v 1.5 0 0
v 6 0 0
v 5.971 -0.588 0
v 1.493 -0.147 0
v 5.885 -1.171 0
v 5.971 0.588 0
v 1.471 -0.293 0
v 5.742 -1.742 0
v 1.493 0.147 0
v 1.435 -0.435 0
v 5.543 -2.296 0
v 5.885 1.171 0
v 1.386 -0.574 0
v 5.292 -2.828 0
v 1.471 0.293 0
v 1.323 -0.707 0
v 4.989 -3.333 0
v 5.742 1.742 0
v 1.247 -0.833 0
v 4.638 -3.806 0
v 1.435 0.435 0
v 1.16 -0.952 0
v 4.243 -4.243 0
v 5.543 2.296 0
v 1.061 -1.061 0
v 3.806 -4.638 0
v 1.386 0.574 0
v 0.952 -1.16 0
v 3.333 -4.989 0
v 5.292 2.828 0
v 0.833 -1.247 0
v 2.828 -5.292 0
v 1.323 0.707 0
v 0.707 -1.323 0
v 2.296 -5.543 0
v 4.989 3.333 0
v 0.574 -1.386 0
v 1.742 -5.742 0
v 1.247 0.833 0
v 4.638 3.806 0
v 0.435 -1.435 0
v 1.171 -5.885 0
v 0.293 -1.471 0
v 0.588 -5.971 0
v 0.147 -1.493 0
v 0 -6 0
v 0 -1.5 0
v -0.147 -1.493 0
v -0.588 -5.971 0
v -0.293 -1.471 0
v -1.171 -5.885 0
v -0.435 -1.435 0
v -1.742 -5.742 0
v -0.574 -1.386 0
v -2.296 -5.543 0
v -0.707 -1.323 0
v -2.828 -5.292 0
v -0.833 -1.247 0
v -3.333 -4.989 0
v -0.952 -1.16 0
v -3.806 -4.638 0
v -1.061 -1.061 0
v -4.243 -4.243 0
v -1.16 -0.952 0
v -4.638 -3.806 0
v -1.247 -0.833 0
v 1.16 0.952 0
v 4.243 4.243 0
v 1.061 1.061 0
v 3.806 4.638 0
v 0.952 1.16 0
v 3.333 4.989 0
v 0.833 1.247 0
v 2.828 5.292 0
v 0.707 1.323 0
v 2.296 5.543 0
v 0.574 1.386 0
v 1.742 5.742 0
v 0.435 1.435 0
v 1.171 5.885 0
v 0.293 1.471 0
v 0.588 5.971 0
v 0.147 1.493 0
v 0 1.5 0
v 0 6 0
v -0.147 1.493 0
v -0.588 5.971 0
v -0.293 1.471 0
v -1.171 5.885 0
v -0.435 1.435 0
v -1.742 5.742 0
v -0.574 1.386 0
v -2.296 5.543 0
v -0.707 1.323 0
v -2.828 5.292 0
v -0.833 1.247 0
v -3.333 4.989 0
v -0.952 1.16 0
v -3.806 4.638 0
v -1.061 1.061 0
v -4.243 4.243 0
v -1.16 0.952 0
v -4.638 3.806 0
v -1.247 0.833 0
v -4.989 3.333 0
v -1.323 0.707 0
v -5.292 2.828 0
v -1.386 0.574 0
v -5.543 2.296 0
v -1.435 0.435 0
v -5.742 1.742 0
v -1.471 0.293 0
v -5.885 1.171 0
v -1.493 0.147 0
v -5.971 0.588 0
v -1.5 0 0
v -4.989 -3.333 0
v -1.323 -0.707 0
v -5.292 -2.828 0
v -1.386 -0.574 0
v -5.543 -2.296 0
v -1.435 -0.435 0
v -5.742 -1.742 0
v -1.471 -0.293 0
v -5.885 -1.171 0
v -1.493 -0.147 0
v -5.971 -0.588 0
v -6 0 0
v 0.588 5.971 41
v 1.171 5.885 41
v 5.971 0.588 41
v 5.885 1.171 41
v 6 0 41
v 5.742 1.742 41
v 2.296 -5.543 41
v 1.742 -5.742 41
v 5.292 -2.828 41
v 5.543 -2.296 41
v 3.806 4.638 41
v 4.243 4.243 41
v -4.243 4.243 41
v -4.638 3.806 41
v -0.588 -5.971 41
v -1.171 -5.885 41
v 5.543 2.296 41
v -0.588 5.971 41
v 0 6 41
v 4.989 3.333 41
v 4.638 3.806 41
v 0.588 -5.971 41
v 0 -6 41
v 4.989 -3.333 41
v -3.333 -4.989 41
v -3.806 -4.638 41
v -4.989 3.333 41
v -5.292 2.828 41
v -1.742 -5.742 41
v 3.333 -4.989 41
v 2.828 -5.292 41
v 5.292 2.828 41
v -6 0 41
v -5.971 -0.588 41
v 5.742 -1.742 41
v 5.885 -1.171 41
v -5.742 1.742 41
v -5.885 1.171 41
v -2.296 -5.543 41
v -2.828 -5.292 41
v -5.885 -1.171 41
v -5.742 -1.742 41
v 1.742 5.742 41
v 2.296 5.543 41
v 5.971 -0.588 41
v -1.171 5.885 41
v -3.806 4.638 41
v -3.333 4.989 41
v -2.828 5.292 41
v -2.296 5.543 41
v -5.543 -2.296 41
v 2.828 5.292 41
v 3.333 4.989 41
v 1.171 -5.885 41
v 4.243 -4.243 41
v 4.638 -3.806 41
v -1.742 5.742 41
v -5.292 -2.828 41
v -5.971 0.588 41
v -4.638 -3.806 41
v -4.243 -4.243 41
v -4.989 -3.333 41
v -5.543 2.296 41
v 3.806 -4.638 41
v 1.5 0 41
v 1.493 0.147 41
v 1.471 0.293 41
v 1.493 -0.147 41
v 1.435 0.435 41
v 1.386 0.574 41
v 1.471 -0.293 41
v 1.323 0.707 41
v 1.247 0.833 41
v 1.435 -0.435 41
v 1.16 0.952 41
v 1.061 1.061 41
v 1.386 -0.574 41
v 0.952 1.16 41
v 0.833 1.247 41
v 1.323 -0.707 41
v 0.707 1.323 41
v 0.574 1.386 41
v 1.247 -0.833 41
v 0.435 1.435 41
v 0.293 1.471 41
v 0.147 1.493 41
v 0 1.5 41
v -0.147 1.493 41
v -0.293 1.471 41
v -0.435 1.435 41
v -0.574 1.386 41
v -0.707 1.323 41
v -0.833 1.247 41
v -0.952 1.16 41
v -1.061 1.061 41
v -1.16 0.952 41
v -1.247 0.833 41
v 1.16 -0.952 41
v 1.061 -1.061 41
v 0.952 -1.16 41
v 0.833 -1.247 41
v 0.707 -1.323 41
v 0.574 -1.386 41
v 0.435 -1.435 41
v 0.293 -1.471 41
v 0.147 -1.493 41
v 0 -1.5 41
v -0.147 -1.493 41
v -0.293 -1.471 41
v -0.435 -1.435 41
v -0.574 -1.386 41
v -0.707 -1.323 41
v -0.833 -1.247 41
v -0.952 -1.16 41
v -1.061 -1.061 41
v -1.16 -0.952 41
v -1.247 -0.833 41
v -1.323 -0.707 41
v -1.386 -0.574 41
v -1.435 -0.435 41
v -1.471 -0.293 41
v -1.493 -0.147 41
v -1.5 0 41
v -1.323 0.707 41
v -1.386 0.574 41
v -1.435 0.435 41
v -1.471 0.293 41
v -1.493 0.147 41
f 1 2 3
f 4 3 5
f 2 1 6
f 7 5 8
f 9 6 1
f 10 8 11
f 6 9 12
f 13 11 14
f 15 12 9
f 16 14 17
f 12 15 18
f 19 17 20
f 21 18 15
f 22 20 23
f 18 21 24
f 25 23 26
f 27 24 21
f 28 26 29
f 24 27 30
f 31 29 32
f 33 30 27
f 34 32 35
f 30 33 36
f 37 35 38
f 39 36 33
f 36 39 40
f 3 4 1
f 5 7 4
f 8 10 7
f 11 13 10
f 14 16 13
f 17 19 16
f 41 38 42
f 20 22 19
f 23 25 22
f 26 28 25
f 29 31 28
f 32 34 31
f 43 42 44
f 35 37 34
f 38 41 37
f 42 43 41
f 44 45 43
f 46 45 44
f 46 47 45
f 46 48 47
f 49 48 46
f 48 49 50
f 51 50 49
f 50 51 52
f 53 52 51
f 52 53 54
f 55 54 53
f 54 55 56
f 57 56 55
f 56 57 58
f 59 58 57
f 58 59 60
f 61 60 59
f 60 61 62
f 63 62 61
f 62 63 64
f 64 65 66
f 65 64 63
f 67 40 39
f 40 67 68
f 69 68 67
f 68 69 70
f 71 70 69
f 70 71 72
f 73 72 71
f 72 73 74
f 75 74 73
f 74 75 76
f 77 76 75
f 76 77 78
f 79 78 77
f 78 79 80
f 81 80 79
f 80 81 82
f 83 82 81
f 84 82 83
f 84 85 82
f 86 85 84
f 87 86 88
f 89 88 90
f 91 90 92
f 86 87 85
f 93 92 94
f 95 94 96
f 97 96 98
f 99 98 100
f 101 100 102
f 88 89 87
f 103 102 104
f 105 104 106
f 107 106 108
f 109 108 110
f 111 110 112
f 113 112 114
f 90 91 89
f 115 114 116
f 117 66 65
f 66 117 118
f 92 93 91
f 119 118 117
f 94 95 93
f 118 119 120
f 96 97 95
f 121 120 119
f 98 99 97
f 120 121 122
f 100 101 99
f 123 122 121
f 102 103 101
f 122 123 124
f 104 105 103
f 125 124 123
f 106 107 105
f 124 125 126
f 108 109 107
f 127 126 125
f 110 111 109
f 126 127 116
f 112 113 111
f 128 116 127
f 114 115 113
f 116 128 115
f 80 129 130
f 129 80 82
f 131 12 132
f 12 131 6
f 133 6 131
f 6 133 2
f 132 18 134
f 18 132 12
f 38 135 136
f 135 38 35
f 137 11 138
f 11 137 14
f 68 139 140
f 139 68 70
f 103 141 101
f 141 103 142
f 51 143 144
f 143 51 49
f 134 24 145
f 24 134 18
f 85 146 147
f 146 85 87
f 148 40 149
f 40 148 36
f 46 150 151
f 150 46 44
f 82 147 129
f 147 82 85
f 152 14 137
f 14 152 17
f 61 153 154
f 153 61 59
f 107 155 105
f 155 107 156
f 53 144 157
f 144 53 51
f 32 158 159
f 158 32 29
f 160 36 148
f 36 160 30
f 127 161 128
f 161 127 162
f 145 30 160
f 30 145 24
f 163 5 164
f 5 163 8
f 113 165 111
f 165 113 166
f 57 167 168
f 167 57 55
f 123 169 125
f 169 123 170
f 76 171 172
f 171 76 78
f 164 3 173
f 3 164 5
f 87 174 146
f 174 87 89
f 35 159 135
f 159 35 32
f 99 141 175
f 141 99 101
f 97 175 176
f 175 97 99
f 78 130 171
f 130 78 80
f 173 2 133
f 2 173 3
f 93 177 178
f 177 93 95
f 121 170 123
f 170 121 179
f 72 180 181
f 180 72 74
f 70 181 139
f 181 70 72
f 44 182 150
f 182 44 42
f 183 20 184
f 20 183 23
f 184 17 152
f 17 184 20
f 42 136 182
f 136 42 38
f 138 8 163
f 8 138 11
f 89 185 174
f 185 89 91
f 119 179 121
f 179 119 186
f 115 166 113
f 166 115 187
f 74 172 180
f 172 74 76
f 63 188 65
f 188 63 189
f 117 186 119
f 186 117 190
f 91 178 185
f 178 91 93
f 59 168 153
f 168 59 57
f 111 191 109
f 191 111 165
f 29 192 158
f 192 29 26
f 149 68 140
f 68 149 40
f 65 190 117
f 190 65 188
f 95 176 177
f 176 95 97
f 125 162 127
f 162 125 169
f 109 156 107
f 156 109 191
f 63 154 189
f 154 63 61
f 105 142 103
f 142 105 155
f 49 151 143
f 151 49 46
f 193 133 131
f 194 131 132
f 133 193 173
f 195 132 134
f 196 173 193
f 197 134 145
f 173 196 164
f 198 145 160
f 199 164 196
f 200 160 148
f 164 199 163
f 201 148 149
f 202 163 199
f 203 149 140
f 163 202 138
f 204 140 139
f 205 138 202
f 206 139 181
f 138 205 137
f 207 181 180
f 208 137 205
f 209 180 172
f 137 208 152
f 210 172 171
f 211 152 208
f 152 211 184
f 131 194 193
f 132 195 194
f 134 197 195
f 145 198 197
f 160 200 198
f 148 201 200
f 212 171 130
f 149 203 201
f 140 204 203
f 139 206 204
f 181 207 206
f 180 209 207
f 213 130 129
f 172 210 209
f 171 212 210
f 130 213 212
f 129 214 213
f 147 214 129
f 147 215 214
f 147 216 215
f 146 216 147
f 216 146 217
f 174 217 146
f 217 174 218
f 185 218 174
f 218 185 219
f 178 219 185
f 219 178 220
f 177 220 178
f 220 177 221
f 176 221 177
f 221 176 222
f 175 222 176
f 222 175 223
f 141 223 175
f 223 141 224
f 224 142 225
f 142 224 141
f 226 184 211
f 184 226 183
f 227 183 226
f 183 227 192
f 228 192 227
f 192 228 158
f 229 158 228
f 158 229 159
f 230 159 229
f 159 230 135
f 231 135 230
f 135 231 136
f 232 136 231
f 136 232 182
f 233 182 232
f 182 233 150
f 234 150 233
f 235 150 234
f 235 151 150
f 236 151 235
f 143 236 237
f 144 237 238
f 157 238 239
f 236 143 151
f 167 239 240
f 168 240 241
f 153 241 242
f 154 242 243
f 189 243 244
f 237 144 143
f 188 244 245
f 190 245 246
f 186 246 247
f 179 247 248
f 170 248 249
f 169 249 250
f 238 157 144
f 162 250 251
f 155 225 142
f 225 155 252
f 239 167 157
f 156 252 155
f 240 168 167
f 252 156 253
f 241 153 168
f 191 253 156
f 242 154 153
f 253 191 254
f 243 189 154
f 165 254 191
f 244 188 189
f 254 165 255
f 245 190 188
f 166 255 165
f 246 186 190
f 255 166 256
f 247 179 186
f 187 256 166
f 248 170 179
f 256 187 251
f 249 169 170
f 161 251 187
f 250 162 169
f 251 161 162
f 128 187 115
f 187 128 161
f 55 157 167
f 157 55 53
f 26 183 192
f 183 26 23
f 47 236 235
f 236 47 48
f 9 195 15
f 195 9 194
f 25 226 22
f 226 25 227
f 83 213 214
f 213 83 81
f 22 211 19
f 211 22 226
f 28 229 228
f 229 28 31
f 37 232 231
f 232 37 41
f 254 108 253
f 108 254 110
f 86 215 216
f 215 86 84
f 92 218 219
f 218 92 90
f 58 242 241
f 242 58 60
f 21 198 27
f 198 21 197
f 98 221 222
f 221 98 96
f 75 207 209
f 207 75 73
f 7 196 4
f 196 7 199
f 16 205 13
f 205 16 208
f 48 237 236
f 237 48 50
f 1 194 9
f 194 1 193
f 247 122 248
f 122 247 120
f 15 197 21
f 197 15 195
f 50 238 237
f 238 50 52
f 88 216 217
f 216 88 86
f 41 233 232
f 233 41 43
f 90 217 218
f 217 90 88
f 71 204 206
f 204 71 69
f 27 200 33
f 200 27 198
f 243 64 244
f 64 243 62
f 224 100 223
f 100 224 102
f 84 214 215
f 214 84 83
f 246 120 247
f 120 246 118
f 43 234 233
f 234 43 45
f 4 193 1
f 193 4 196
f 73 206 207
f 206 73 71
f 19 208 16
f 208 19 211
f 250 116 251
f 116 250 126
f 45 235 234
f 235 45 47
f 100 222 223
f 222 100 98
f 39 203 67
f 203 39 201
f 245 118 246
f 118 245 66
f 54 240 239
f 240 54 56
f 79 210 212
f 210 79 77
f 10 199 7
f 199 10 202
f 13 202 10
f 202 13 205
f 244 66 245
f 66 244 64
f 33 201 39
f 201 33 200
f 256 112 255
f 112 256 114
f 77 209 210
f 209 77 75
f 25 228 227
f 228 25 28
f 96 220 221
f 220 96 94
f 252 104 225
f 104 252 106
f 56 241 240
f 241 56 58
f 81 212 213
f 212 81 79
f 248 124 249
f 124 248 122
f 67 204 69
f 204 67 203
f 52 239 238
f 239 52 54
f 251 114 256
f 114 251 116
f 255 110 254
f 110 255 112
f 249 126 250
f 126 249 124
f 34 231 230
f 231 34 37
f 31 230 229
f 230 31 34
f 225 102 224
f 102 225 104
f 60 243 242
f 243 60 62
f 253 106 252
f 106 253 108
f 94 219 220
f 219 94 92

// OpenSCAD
// Hose barb reducer - a straight (axial) reducer that joins two silicone tubing sizes via
// stacked barbs, with a through-bore. The two barb sections are held in a cylindrical collar.
// NOVEL general part (a generic reducer, not any one labware item).
//

t1   = 8;
t2   = 5;
bore = 3;
L    = 41;
coll = 12;

$fn = 64;

barb_d1 = 7.5 + 2 * (t1 / 2);      // outer tip of the 8 mm barbs
barb_d2 = 7.5 + 2 * (t2 / 2);      // outer tip of the 5 mm barbs

module barb(h, d_tip, d_base) {
    d0 = max(d_base, t1);                 // keep the root no smaller than the bore
    linear_extrude(h) circle(d = d0);
    translate([0, 0, h * 0.25]) difference() {
        cylinder(h = h * 0.75, d = d0);
        translate([0, 0, -1]) cylinder(h = h * 0.76, d = d_tip);
    }
}

difference() {
    union() {
        for (z = [0, t1])
            translate([0, 0, z]) barb(h = 10, d_tip = barb_d1, d_base = 7.5);   // upper barb pair
        for (z = [0, t2])
            translate([0, 0, z]) barb(h = 8, d_tip = barb_d2, d_base = 6.5);    // lower barb pair
        cylinder(h = L, d = coll);
    }
    translate([0, 0, -1]) cylinder(h = L + 2, d = bore);
}
